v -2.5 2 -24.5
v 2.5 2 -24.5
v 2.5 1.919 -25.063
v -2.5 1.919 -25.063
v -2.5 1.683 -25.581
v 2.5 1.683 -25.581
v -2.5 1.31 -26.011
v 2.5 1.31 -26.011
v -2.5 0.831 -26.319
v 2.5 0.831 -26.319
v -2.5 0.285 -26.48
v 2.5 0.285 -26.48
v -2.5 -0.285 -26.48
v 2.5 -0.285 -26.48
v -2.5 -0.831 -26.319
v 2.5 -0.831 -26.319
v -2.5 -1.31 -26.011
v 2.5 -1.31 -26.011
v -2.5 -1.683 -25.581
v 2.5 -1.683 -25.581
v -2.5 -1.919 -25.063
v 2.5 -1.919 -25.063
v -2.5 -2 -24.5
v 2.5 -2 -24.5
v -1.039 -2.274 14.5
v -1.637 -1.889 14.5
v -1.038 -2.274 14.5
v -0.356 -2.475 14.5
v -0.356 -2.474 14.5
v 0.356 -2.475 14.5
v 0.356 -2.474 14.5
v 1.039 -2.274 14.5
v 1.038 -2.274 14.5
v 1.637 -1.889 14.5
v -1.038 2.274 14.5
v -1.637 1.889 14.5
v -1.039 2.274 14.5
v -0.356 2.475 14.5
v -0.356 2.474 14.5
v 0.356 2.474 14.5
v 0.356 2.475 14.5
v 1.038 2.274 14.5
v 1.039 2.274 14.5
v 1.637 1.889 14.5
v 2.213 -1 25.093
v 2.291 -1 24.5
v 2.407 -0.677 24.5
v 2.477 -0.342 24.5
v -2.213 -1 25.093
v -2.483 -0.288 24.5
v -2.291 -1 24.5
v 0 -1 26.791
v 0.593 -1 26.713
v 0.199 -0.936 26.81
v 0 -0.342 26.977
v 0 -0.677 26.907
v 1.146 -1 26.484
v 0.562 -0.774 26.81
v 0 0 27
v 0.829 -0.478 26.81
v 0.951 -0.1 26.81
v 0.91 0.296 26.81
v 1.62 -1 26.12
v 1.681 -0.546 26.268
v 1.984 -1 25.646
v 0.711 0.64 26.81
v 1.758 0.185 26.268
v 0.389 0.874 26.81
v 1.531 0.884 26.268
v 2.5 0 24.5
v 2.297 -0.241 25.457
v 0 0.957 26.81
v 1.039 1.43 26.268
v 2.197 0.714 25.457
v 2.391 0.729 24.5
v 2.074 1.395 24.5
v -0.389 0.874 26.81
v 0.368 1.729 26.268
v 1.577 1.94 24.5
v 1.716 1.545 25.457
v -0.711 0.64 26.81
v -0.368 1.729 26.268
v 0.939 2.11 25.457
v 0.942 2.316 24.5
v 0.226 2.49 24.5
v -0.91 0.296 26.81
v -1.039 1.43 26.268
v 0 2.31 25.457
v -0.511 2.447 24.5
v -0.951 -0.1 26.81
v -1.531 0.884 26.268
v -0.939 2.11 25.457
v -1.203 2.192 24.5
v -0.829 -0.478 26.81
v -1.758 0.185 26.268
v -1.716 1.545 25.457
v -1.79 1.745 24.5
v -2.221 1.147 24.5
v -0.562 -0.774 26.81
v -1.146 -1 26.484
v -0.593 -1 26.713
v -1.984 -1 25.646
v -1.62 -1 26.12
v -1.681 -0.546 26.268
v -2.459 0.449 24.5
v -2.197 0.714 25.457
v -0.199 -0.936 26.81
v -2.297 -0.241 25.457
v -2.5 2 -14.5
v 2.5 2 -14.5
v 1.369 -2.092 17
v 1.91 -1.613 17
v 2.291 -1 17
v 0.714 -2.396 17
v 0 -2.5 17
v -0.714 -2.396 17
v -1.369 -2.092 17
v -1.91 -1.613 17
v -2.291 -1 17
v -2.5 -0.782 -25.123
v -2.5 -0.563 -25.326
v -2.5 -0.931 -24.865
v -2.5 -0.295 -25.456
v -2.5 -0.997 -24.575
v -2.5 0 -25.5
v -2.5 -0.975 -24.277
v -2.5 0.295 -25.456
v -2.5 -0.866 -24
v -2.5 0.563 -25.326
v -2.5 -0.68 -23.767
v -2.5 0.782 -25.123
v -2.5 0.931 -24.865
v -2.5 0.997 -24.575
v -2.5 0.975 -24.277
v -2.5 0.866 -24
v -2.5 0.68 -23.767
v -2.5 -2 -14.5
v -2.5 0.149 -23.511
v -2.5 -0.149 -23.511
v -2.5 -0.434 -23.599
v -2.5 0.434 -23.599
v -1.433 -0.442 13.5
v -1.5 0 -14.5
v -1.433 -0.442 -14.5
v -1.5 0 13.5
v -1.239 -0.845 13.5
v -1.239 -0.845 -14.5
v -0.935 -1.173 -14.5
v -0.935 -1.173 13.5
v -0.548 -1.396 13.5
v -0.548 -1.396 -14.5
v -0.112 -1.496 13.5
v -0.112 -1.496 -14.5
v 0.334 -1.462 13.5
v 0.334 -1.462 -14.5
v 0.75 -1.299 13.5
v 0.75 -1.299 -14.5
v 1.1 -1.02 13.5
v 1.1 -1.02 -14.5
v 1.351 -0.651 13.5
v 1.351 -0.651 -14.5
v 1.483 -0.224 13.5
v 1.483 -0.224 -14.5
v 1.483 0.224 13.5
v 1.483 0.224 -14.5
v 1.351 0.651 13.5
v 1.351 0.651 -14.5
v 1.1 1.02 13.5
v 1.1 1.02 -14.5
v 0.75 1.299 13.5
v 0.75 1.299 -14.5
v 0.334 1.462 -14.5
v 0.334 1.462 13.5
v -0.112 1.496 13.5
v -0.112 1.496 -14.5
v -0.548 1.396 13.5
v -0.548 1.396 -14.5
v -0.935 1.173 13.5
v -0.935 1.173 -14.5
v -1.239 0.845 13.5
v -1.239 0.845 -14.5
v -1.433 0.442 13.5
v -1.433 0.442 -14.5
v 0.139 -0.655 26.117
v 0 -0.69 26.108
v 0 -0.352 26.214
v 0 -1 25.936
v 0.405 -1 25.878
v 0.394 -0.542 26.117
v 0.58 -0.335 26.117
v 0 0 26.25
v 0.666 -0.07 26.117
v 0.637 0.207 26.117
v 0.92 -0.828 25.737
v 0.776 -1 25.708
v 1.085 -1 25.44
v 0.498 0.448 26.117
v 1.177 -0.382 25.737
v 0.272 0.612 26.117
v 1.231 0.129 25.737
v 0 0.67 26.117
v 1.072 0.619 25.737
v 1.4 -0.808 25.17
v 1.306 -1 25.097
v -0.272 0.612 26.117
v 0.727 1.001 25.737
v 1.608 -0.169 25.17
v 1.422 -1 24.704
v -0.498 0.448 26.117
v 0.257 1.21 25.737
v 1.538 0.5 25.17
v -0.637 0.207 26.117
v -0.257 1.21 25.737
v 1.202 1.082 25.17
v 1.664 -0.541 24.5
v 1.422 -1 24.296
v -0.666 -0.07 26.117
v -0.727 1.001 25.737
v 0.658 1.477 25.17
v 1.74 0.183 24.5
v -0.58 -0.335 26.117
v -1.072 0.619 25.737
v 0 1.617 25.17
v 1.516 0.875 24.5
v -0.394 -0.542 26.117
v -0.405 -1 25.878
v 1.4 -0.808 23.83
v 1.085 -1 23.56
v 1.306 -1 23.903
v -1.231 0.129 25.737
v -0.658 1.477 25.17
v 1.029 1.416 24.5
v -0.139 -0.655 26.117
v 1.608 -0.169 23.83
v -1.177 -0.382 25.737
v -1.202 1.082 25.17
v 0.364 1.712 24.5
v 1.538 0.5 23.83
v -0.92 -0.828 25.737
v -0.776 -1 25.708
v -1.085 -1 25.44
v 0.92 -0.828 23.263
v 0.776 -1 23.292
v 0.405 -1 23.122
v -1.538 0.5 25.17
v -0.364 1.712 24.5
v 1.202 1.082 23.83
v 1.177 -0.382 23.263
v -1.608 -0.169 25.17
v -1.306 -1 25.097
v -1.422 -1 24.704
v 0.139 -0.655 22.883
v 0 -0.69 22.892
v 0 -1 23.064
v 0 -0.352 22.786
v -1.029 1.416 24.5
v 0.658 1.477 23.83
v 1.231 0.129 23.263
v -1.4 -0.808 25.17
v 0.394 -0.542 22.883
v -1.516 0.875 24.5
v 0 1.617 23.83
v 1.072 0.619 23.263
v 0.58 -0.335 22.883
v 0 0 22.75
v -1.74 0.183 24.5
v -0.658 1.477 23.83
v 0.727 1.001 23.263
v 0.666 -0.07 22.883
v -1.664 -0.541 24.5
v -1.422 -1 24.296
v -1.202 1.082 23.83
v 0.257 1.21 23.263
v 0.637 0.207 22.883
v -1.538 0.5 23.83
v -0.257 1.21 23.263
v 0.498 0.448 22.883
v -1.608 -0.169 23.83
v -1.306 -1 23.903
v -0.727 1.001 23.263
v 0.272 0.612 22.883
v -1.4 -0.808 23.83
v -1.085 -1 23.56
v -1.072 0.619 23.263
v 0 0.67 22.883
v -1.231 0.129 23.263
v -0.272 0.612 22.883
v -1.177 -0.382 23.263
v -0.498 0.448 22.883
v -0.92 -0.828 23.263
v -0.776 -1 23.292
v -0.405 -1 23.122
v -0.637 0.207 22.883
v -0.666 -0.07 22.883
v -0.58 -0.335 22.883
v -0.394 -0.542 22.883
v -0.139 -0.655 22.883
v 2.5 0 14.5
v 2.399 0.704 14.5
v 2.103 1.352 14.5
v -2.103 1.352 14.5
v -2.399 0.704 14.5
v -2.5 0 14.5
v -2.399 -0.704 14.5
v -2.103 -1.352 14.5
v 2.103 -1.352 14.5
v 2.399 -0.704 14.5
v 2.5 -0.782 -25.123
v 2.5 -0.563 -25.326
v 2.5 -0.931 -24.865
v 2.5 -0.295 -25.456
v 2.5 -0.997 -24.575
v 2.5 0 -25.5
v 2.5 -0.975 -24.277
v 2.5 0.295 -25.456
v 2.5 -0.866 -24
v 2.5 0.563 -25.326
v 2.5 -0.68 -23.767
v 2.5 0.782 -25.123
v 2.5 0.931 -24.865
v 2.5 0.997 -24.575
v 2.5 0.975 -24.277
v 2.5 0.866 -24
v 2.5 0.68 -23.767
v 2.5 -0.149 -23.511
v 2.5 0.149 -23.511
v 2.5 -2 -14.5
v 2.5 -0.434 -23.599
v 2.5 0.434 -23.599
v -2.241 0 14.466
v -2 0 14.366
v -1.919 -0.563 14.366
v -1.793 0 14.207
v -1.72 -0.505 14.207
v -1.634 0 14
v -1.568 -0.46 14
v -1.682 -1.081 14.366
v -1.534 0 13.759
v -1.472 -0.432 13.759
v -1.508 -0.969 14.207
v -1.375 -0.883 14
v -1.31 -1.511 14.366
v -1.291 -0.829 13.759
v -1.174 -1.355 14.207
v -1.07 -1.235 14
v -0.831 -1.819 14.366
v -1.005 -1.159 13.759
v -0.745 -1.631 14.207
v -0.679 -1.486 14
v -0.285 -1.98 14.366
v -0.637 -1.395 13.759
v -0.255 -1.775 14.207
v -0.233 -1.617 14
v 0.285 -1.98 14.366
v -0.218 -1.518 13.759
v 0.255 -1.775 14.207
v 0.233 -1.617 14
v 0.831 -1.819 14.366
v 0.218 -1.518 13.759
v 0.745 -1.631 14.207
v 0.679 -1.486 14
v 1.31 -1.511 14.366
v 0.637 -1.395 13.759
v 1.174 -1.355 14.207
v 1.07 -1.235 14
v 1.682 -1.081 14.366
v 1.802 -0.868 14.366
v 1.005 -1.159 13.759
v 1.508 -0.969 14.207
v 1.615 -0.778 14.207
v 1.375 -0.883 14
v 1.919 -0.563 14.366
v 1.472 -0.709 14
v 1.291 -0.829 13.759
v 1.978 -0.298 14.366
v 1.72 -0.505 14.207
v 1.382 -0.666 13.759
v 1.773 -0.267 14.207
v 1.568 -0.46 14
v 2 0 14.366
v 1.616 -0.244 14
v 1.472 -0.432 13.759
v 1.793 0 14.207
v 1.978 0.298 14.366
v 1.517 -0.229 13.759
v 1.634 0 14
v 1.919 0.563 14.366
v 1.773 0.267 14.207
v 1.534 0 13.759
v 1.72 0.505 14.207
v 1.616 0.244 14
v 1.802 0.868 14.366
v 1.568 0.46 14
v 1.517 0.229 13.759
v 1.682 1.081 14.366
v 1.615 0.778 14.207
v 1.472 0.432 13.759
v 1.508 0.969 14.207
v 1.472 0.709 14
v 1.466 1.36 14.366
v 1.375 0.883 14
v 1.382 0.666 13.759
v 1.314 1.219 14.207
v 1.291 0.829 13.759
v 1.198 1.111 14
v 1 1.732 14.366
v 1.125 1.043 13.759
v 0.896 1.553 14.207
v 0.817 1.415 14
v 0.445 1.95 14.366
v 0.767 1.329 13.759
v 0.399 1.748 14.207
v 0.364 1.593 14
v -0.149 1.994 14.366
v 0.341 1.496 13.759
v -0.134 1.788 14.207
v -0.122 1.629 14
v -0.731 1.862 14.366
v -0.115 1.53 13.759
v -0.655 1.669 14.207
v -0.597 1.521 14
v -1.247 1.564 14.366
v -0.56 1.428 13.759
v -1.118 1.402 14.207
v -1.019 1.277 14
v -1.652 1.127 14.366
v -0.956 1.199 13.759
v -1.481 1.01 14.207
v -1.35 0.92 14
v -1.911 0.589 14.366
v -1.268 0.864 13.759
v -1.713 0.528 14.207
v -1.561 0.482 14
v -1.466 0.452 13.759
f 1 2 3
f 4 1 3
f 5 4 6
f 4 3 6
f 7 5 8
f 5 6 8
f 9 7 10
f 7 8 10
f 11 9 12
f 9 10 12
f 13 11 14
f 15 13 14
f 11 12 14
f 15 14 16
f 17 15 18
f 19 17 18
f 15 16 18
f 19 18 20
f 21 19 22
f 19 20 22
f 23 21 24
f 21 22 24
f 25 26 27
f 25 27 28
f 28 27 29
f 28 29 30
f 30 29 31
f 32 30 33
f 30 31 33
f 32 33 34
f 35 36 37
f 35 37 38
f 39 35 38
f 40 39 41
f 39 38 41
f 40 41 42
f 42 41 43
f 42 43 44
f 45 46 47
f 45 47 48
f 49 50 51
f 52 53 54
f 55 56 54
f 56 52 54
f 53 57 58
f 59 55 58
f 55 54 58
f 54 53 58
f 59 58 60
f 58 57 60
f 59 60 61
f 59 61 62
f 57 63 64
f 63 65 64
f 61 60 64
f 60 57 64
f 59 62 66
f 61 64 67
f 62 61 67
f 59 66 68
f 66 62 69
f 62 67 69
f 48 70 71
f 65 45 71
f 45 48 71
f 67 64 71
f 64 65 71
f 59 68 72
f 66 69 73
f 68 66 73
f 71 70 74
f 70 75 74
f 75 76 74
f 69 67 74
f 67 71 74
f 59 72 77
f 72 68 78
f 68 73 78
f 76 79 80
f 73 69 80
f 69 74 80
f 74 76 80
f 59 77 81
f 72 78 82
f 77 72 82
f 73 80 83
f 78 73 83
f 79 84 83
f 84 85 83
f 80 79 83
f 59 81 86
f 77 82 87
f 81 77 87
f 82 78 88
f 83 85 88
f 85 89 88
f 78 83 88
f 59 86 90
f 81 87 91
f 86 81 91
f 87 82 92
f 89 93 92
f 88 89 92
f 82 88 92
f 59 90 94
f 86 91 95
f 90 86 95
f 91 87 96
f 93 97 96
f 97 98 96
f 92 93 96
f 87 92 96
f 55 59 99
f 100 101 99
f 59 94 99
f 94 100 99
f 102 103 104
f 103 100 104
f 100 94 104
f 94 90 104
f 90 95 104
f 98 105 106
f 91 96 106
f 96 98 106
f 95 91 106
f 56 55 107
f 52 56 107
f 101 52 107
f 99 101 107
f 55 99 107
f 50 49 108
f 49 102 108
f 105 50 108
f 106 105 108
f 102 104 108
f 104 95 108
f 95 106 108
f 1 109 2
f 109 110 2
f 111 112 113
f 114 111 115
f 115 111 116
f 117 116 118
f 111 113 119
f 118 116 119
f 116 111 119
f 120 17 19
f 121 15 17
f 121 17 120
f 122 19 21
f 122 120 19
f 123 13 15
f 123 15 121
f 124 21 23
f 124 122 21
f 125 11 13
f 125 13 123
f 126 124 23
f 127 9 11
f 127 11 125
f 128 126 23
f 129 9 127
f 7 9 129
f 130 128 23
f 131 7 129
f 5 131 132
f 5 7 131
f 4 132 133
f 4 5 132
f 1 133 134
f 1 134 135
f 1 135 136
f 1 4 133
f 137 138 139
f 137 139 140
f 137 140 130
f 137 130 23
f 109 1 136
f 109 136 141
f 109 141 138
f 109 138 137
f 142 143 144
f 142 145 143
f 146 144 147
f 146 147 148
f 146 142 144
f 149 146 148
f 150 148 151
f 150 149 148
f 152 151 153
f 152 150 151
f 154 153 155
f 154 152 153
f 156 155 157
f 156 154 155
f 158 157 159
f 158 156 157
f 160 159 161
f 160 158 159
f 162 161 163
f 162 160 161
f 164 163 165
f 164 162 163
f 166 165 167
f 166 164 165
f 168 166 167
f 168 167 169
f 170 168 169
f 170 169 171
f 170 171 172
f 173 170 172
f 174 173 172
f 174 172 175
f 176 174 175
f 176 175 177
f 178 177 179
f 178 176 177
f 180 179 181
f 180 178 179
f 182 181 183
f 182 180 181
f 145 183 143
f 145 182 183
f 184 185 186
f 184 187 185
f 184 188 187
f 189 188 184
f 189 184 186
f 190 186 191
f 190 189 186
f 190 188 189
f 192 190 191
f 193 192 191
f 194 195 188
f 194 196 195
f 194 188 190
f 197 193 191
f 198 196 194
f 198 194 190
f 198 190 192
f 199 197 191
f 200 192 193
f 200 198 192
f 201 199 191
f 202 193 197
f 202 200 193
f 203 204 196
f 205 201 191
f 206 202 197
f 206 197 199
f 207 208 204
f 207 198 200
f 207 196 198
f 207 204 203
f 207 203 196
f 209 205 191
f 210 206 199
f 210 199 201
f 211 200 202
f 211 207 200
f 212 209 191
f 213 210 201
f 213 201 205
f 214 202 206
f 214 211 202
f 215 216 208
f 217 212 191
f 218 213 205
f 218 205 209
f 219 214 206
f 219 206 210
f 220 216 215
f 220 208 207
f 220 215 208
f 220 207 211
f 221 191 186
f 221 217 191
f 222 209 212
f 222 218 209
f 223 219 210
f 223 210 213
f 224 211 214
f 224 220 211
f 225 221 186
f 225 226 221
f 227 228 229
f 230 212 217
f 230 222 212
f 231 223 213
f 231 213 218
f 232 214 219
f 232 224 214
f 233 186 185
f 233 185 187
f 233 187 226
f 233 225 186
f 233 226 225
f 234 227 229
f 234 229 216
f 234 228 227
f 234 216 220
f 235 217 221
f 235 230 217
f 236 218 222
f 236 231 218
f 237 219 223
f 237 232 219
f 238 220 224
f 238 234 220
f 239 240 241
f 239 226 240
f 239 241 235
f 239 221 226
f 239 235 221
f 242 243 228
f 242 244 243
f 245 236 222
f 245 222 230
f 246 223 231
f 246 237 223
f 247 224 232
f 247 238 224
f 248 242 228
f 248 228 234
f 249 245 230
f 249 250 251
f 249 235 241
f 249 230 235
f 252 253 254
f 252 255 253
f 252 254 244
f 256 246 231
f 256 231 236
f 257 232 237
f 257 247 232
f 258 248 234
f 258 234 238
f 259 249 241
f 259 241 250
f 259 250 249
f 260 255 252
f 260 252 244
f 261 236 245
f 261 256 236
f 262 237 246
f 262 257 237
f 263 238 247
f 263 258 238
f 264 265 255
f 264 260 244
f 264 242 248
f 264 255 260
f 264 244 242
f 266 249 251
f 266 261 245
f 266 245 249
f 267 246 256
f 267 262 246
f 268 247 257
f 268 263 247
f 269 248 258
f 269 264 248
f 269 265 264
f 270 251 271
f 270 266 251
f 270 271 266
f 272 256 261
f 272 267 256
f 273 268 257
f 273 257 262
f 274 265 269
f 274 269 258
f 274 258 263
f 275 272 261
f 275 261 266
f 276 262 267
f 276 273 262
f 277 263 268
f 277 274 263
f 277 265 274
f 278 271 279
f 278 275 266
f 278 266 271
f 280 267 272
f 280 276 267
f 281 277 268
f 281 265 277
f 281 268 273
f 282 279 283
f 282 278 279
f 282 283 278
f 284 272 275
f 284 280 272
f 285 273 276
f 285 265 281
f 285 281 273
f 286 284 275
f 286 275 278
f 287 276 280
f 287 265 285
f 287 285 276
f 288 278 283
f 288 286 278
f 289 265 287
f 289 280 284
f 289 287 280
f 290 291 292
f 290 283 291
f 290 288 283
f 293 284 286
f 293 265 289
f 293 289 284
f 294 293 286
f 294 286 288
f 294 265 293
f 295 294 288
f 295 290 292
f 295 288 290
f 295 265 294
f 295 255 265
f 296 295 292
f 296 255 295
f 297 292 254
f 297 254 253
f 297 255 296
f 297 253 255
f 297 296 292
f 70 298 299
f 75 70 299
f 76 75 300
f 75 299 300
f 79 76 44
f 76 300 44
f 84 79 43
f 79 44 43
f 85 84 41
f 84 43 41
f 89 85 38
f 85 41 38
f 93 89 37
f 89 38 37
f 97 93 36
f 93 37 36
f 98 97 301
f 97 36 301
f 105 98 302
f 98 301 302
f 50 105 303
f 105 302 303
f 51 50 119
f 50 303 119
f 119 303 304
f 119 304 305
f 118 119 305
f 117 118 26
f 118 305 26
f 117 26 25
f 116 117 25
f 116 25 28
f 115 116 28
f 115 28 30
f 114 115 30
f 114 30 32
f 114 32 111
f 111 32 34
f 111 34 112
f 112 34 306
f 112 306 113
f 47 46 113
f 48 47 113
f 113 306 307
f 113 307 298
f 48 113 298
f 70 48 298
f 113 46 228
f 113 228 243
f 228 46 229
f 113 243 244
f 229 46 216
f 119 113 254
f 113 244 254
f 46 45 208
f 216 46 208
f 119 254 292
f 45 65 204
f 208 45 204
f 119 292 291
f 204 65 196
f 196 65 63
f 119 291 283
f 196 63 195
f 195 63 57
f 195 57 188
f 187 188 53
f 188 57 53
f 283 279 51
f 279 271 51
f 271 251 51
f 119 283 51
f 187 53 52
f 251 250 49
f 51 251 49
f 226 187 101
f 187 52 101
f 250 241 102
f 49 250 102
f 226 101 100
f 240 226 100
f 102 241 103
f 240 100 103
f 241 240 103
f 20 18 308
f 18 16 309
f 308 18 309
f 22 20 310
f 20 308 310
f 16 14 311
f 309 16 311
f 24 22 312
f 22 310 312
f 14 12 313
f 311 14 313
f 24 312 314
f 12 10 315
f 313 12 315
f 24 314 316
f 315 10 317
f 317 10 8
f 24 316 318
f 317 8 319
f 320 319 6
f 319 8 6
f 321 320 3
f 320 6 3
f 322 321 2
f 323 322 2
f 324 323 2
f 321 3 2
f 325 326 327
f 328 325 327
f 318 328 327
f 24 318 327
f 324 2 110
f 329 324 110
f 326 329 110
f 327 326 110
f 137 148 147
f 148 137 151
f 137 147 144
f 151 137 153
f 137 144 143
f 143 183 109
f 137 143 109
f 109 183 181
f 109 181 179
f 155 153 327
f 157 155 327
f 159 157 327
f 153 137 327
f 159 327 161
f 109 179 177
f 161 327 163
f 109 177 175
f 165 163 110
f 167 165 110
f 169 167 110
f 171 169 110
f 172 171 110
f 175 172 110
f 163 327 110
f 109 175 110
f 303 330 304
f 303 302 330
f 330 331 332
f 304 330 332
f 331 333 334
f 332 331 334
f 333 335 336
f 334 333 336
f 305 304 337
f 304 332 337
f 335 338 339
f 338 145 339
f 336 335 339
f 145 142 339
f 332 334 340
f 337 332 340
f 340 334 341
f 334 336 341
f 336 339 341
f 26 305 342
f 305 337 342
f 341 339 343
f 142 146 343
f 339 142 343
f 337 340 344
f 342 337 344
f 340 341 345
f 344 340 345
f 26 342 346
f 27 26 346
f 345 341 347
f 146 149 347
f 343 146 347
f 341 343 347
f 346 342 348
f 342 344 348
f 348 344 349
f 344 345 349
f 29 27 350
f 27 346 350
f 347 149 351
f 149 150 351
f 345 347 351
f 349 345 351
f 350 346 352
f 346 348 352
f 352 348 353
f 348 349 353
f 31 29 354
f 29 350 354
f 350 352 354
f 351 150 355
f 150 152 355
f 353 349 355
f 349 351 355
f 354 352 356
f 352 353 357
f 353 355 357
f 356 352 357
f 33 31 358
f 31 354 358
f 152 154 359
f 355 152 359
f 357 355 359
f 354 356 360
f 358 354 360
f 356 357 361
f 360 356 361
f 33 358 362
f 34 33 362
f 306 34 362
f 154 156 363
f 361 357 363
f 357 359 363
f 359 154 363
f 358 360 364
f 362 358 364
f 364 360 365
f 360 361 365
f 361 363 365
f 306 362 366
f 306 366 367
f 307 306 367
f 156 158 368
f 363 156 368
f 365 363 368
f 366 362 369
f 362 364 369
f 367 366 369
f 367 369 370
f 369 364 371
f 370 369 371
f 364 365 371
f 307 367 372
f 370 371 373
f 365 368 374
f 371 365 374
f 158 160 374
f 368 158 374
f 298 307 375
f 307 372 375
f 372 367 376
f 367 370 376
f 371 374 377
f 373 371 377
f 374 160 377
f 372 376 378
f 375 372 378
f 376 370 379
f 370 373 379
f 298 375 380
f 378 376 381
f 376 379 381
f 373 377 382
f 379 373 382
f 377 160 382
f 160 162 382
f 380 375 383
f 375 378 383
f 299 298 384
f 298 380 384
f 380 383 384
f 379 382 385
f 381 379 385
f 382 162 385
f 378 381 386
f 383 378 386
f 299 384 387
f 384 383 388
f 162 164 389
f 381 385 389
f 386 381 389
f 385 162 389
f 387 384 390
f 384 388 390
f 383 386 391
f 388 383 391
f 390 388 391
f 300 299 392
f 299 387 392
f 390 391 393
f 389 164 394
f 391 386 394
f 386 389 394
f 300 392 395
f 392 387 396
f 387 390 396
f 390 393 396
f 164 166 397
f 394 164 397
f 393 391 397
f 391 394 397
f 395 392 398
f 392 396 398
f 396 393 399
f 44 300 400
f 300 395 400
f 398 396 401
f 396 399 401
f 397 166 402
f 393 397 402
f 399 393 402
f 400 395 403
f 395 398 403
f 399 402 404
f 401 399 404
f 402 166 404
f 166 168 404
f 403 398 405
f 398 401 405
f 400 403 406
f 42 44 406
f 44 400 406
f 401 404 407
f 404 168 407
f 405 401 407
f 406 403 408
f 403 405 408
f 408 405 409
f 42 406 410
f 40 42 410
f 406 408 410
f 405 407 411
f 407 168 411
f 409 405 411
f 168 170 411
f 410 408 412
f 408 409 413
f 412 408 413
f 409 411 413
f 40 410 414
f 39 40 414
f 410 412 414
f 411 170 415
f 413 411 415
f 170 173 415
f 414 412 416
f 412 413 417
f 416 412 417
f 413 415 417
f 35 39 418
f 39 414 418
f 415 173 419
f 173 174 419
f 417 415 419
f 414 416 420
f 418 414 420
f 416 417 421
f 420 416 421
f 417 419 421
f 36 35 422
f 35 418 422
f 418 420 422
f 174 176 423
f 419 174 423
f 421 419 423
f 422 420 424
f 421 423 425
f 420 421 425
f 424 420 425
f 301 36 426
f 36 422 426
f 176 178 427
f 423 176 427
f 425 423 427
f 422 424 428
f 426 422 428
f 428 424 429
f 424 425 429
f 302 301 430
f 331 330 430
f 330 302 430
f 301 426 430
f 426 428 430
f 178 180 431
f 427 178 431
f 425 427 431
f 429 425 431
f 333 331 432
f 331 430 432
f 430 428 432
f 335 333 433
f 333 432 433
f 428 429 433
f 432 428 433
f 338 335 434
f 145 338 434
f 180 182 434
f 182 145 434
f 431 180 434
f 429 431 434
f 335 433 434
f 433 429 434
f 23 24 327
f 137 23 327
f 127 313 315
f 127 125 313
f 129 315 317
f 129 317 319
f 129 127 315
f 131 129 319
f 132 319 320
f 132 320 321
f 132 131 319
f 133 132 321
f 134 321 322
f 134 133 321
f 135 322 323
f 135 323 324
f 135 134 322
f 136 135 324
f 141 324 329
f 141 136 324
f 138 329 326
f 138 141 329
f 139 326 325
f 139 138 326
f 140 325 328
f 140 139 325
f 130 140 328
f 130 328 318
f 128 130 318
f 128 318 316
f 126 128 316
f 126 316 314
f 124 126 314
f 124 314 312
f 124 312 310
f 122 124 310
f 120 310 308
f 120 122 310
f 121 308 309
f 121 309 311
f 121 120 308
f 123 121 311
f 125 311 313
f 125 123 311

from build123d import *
from build123d.topology import SkipClean

# Parameters (mm, degrees)
SKETCH_1_R          = 1.5
EXTRUDE_1_DEPTH     = 14.5
SKETCH_2_R          = 2.5
EXTRUDE_2_DEPTH     = 10
FILLET_1_R          = 1
CUT_EXTRUDE_1_DEPTH = 10
SKETCH_6_R          = 1
EXTRUDE_3_DEPTH     = 2.5


with BuildPart() as part:
    # 草图1 → 凸台-拉伸1 (new body)
    with BuildSketch(Plane.XY):
        with Locations(Location((0, 0, 0), (0, 0, 180))):
            Circle(SKETCH_1_R)
    extrude_1 = extrude(amount=EXTRUDE_1_DEPTH)

    # 草图2 → 凸台-拉伸2 (add)
    with BuildSketch(Plane.XY.offset(14.5)):
        Circle(SKETCH_2_R)
    extrude(amount=EXTRUDE_2_DEPTH)

    # 圆角1
    fillet_1_edges = [part.edges().sort_by_distance(p)[0] for p in [
        (1.5, 0, 14.5),
    ]]
    fillet(fillet_1_edges, radius=FILLET_1_R - 0.0001)  # a hair under: the kernel refuses the full size

    # 草图3 → 旋转1 (revolve)
    with SkipClean():  # the faces are left unmerged after this step: merging them gives an invalid solid
        with BuildSketch(Plane(origin=(0, 0, 0), x_dir=(0, 0, -1), z_dir=(1, 0, 0))):
            with BuildLine():
                ThreePointArc((-27, 0), (-24.5, -2.5), (-22, 0))
                Line((-22, 0), (-24.5, 0))
                Line((-24.5, 0), (-27, 0))
            make_face()
            with BuildLine():
                Line((-24.5, 0), (-22, 0))
                ThreePointArc((-22, 0), (-24.5, 2.5), (-27, 0))
                Line((-27, 0), (-24.5, 0))
            make_face()
        revolve(axis=Axis((0, 0, 0), (0, 0, 1)))
    add(part.part.scale(1), mode=Mode.REPLACE)  # the faces are merged on a copy

    # 草图4 → 切除-拉伸1 (cut)
    with BuildSketch(Plane.XY.offset(27)):
        Polygon((-2.5, -1), (0, -1), (2.5, -1), (2.5, -3), (-2.5, -3), align=None)
    extrude(amount=-CUT_EXTRUDE_1_DEPTH, mode=Mode.SUBTRACT)

    # 草图5 → 切除-旋转11 (revolve, cut)
    with BuildSketch(Plane(origin=(0, 0, 0), x_dir=(0, 0, -1), z_dir=(1, 0, 0))):
        with BuildLine():
            Line((-22.75, 0), (-26.25, 0))
            ThreePointArc((-26.25, 0), (-24.5, -1.75), (-22.75, 0))
        make_face()
    revolve(axis=Axis((0, 0, 0), (0, 0, 1)), mode=Mode.SUBTRACT)

    # 镜向1: 凸台-拉伸1 across plane
    with SkipClean():  # the faces are left unmerged after this step: merging them gives an invalid solid
        add(extrude_1.mirror(Plane.XY))

    # 草图6 → 凸台-拉伸3 (add, symmetric)
    with BuildSketch(Plane(origin=(0, 0, 0), x_dir=(0, 0, -1), z_dir=(1, 0, 0))):
        with BuildLine():
            Line((24.5, -2), (14.5, -2))
            Line((14.5, -2), (14.5, 0))
            Line((14.5, 0), (14.5, 2))
            Line((14.5, 2), (24.5, 2))
            ThreePointArc((24.5, 2), (26.5, 0), (24.5, -2))
        make_face()
        with Locations((24.5, 0)):
            Circle(SKETCH_6_R, mode=Mode.SUBTRACT)
    extrude(amount=EXTRUDE_3_DEPTH, both=True)


solid = part.part
